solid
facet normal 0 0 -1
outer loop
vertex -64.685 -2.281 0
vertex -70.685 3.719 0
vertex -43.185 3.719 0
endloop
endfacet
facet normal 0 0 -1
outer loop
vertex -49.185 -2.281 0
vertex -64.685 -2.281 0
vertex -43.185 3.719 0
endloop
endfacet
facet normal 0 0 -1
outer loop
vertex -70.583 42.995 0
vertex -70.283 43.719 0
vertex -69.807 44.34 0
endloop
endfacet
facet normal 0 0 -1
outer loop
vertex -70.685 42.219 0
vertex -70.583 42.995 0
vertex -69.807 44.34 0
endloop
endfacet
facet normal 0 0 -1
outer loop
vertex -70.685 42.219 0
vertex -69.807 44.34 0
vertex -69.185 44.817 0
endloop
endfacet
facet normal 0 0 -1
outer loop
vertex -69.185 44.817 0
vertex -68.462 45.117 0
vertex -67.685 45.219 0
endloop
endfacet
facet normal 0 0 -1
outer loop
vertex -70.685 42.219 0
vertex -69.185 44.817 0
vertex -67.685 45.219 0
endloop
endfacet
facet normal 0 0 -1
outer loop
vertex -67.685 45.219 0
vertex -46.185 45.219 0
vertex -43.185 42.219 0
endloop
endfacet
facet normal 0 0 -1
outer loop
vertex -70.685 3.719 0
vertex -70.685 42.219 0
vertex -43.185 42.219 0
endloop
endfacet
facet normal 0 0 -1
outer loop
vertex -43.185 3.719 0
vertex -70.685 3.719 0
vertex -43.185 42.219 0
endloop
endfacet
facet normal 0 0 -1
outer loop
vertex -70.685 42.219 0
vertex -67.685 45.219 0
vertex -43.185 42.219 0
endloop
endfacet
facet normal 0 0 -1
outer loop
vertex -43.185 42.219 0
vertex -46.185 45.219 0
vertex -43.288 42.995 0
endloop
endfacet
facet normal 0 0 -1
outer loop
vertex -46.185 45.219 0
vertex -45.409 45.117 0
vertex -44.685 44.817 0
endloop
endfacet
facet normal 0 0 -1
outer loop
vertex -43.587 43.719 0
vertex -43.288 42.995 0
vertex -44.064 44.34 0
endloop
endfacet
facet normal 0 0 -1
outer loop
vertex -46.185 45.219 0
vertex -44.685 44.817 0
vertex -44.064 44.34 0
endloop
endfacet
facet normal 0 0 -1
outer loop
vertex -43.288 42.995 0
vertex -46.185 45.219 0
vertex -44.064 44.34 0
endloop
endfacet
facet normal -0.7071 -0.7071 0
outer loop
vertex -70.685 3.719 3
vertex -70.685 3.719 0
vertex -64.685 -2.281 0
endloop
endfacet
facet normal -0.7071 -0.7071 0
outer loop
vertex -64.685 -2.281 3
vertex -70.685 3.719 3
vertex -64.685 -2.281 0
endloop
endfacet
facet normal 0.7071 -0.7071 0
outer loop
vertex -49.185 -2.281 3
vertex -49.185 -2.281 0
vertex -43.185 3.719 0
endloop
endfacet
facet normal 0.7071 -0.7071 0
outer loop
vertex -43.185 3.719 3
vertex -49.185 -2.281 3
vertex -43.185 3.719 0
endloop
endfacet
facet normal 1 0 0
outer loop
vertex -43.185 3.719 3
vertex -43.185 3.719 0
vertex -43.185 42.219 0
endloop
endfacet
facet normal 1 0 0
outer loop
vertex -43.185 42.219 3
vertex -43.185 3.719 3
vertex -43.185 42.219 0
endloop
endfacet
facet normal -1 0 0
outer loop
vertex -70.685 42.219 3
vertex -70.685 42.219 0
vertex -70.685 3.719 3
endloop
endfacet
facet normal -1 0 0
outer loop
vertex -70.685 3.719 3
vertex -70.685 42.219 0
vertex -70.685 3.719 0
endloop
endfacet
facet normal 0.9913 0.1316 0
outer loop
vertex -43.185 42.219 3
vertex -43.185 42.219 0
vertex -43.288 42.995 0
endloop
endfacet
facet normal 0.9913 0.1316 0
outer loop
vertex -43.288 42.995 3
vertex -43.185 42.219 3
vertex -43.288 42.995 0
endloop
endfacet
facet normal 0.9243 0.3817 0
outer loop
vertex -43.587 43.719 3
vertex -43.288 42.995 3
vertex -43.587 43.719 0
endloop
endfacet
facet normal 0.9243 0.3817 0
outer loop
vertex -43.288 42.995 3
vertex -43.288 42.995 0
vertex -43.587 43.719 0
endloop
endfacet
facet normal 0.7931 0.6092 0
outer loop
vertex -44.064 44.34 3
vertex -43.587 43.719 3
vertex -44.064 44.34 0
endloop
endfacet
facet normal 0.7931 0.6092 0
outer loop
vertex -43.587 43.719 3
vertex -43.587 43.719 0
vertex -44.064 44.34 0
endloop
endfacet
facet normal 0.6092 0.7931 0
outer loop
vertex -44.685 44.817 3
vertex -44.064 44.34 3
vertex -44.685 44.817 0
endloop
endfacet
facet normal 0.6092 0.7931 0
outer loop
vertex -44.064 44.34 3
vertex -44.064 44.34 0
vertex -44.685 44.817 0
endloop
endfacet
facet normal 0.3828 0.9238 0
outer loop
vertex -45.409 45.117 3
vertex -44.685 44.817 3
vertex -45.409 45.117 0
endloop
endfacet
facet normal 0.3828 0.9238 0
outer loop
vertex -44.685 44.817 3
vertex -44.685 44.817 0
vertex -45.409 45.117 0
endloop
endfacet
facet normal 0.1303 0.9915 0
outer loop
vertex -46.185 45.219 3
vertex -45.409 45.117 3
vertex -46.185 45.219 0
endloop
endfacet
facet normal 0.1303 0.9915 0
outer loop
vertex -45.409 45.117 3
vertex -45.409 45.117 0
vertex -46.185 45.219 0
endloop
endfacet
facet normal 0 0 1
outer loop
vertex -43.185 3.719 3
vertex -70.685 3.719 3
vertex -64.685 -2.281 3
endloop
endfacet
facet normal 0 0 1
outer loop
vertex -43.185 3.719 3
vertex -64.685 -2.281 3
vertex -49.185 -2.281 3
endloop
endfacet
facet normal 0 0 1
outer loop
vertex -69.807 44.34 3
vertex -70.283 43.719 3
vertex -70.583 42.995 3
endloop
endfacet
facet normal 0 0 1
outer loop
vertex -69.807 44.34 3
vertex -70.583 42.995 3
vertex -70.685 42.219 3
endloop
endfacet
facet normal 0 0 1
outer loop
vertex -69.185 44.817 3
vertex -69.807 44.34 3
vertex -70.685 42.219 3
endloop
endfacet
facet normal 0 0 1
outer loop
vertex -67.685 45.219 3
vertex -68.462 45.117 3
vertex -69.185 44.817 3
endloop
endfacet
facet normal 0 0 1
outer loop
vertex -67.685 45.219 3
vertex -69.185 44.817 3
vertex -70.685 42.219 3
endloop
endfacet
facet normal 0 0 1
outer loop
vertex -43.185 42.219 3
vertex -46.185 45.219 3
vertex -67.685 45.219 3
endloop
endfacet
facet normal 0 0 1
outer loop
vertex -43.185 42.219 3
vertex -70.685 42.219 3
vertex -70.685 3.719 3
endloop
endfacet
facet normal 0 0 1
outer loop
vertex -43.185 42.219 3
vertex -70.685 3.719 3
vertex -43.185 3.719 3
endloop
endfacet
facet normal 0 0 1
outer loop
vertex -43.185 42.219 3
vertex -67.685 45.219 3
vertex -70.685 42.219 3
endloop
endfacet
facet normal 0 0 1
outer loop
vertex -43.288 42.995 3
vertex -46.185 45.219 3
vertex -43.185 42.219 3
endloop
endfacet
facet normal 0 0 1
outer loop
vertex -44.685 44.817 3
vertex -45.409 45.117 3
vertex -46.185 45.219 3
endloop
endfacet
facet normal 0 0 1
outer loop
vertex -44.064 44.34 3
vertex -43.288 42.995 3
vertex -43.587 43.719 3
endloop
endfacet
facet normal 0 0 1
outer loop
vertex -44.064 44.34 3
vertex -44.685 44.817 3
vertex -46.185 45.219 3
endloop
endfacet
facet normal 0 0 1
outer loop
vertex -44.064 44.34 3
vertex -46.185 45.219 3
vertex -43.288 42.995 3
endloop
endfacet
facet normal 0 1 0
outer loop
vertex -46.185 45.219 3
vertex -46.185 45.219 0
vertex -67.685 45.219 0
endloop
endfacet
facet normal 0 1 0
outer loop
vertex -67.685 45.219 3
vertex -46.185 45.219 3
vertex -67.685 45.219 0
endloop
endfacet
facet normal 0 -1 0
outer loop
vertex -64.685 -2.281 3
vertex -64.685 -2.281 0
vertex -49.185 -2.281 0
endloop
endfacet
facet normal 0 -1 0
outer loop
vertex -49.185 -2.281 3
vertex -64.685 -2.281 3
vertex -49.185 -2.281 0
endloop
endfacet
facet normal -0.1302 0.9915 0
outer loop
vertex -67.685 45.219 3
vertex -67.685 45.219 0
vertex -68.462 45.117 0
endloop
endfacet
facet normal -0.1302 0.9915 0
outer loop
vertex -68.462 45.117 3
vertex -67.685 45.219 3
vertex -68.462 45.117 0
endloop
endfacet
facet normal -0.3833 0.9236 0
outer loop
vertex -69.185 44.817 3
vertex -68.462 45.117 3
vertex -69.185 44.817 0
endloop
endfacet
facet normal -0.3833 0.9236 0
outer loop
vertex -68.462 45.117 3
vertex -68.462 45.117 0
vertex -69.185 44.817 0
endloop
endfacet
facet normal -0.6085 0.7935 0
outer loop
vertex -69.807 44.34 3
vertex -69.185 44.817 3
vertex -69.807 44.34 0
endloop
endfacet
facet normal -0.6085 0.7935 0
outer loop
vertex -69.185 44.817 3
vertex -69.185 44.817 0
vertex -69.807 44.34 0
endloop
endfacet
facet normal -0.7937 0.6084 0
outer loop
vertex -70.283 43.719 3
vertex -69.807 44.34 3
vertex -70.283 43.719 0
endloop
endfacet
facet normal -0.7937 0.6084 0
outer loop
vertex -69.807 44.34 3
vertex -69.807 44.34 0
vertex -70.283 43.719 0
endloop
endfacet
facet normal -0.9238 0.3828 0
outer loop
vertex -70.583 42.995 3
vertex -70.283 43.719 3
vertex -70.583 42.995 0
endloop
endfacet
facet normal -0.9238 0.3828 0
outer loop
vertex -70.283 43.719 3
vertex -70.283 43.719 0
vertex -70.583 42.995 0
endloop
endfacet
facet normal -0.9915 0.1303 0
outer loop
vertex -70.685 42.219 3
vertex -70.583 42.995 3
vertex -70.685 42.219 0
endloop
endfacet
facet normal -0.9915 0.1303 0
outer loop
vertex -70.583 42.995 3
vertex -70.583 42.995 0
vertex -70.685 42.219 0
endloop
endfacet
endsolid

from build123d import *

# Parameters (mm, degrees)
F1_DEPTH = 3


with BuildPart() as f1:
    # F0 (on Top) → F1 (new body)
    with BuildSketch(Plane.XY):
        with BuildLine():
            Line((-46.185345, 45.218922), (-67.685345, 45.218922))
            ThreePointArc((-67.685345, 45.218922), (-69.806666, 44.340243), (-70.685345, 42.218922))
            Line((-70.685345, 42.218922), (-70.685345, 3.718922))
            Line((-70.685345, 3.718922), (-64.685345, -2.281078))
            Line((-64.685345, -2.281078), (-49.185345, -2.281078))
            Line((-49.185345, -2.281078), (-43.185345, 3.718922))
            Line((-43.185345, 3.718922), (-43.185345, 42.218922))
            ThreePointArc((-43.185345, 42.218922), (-44.064025, 44.340243), (-46.185345, 45.218922))
        make_face()
    extrude(amount=F1_DEPTH)


solid = f1.part
